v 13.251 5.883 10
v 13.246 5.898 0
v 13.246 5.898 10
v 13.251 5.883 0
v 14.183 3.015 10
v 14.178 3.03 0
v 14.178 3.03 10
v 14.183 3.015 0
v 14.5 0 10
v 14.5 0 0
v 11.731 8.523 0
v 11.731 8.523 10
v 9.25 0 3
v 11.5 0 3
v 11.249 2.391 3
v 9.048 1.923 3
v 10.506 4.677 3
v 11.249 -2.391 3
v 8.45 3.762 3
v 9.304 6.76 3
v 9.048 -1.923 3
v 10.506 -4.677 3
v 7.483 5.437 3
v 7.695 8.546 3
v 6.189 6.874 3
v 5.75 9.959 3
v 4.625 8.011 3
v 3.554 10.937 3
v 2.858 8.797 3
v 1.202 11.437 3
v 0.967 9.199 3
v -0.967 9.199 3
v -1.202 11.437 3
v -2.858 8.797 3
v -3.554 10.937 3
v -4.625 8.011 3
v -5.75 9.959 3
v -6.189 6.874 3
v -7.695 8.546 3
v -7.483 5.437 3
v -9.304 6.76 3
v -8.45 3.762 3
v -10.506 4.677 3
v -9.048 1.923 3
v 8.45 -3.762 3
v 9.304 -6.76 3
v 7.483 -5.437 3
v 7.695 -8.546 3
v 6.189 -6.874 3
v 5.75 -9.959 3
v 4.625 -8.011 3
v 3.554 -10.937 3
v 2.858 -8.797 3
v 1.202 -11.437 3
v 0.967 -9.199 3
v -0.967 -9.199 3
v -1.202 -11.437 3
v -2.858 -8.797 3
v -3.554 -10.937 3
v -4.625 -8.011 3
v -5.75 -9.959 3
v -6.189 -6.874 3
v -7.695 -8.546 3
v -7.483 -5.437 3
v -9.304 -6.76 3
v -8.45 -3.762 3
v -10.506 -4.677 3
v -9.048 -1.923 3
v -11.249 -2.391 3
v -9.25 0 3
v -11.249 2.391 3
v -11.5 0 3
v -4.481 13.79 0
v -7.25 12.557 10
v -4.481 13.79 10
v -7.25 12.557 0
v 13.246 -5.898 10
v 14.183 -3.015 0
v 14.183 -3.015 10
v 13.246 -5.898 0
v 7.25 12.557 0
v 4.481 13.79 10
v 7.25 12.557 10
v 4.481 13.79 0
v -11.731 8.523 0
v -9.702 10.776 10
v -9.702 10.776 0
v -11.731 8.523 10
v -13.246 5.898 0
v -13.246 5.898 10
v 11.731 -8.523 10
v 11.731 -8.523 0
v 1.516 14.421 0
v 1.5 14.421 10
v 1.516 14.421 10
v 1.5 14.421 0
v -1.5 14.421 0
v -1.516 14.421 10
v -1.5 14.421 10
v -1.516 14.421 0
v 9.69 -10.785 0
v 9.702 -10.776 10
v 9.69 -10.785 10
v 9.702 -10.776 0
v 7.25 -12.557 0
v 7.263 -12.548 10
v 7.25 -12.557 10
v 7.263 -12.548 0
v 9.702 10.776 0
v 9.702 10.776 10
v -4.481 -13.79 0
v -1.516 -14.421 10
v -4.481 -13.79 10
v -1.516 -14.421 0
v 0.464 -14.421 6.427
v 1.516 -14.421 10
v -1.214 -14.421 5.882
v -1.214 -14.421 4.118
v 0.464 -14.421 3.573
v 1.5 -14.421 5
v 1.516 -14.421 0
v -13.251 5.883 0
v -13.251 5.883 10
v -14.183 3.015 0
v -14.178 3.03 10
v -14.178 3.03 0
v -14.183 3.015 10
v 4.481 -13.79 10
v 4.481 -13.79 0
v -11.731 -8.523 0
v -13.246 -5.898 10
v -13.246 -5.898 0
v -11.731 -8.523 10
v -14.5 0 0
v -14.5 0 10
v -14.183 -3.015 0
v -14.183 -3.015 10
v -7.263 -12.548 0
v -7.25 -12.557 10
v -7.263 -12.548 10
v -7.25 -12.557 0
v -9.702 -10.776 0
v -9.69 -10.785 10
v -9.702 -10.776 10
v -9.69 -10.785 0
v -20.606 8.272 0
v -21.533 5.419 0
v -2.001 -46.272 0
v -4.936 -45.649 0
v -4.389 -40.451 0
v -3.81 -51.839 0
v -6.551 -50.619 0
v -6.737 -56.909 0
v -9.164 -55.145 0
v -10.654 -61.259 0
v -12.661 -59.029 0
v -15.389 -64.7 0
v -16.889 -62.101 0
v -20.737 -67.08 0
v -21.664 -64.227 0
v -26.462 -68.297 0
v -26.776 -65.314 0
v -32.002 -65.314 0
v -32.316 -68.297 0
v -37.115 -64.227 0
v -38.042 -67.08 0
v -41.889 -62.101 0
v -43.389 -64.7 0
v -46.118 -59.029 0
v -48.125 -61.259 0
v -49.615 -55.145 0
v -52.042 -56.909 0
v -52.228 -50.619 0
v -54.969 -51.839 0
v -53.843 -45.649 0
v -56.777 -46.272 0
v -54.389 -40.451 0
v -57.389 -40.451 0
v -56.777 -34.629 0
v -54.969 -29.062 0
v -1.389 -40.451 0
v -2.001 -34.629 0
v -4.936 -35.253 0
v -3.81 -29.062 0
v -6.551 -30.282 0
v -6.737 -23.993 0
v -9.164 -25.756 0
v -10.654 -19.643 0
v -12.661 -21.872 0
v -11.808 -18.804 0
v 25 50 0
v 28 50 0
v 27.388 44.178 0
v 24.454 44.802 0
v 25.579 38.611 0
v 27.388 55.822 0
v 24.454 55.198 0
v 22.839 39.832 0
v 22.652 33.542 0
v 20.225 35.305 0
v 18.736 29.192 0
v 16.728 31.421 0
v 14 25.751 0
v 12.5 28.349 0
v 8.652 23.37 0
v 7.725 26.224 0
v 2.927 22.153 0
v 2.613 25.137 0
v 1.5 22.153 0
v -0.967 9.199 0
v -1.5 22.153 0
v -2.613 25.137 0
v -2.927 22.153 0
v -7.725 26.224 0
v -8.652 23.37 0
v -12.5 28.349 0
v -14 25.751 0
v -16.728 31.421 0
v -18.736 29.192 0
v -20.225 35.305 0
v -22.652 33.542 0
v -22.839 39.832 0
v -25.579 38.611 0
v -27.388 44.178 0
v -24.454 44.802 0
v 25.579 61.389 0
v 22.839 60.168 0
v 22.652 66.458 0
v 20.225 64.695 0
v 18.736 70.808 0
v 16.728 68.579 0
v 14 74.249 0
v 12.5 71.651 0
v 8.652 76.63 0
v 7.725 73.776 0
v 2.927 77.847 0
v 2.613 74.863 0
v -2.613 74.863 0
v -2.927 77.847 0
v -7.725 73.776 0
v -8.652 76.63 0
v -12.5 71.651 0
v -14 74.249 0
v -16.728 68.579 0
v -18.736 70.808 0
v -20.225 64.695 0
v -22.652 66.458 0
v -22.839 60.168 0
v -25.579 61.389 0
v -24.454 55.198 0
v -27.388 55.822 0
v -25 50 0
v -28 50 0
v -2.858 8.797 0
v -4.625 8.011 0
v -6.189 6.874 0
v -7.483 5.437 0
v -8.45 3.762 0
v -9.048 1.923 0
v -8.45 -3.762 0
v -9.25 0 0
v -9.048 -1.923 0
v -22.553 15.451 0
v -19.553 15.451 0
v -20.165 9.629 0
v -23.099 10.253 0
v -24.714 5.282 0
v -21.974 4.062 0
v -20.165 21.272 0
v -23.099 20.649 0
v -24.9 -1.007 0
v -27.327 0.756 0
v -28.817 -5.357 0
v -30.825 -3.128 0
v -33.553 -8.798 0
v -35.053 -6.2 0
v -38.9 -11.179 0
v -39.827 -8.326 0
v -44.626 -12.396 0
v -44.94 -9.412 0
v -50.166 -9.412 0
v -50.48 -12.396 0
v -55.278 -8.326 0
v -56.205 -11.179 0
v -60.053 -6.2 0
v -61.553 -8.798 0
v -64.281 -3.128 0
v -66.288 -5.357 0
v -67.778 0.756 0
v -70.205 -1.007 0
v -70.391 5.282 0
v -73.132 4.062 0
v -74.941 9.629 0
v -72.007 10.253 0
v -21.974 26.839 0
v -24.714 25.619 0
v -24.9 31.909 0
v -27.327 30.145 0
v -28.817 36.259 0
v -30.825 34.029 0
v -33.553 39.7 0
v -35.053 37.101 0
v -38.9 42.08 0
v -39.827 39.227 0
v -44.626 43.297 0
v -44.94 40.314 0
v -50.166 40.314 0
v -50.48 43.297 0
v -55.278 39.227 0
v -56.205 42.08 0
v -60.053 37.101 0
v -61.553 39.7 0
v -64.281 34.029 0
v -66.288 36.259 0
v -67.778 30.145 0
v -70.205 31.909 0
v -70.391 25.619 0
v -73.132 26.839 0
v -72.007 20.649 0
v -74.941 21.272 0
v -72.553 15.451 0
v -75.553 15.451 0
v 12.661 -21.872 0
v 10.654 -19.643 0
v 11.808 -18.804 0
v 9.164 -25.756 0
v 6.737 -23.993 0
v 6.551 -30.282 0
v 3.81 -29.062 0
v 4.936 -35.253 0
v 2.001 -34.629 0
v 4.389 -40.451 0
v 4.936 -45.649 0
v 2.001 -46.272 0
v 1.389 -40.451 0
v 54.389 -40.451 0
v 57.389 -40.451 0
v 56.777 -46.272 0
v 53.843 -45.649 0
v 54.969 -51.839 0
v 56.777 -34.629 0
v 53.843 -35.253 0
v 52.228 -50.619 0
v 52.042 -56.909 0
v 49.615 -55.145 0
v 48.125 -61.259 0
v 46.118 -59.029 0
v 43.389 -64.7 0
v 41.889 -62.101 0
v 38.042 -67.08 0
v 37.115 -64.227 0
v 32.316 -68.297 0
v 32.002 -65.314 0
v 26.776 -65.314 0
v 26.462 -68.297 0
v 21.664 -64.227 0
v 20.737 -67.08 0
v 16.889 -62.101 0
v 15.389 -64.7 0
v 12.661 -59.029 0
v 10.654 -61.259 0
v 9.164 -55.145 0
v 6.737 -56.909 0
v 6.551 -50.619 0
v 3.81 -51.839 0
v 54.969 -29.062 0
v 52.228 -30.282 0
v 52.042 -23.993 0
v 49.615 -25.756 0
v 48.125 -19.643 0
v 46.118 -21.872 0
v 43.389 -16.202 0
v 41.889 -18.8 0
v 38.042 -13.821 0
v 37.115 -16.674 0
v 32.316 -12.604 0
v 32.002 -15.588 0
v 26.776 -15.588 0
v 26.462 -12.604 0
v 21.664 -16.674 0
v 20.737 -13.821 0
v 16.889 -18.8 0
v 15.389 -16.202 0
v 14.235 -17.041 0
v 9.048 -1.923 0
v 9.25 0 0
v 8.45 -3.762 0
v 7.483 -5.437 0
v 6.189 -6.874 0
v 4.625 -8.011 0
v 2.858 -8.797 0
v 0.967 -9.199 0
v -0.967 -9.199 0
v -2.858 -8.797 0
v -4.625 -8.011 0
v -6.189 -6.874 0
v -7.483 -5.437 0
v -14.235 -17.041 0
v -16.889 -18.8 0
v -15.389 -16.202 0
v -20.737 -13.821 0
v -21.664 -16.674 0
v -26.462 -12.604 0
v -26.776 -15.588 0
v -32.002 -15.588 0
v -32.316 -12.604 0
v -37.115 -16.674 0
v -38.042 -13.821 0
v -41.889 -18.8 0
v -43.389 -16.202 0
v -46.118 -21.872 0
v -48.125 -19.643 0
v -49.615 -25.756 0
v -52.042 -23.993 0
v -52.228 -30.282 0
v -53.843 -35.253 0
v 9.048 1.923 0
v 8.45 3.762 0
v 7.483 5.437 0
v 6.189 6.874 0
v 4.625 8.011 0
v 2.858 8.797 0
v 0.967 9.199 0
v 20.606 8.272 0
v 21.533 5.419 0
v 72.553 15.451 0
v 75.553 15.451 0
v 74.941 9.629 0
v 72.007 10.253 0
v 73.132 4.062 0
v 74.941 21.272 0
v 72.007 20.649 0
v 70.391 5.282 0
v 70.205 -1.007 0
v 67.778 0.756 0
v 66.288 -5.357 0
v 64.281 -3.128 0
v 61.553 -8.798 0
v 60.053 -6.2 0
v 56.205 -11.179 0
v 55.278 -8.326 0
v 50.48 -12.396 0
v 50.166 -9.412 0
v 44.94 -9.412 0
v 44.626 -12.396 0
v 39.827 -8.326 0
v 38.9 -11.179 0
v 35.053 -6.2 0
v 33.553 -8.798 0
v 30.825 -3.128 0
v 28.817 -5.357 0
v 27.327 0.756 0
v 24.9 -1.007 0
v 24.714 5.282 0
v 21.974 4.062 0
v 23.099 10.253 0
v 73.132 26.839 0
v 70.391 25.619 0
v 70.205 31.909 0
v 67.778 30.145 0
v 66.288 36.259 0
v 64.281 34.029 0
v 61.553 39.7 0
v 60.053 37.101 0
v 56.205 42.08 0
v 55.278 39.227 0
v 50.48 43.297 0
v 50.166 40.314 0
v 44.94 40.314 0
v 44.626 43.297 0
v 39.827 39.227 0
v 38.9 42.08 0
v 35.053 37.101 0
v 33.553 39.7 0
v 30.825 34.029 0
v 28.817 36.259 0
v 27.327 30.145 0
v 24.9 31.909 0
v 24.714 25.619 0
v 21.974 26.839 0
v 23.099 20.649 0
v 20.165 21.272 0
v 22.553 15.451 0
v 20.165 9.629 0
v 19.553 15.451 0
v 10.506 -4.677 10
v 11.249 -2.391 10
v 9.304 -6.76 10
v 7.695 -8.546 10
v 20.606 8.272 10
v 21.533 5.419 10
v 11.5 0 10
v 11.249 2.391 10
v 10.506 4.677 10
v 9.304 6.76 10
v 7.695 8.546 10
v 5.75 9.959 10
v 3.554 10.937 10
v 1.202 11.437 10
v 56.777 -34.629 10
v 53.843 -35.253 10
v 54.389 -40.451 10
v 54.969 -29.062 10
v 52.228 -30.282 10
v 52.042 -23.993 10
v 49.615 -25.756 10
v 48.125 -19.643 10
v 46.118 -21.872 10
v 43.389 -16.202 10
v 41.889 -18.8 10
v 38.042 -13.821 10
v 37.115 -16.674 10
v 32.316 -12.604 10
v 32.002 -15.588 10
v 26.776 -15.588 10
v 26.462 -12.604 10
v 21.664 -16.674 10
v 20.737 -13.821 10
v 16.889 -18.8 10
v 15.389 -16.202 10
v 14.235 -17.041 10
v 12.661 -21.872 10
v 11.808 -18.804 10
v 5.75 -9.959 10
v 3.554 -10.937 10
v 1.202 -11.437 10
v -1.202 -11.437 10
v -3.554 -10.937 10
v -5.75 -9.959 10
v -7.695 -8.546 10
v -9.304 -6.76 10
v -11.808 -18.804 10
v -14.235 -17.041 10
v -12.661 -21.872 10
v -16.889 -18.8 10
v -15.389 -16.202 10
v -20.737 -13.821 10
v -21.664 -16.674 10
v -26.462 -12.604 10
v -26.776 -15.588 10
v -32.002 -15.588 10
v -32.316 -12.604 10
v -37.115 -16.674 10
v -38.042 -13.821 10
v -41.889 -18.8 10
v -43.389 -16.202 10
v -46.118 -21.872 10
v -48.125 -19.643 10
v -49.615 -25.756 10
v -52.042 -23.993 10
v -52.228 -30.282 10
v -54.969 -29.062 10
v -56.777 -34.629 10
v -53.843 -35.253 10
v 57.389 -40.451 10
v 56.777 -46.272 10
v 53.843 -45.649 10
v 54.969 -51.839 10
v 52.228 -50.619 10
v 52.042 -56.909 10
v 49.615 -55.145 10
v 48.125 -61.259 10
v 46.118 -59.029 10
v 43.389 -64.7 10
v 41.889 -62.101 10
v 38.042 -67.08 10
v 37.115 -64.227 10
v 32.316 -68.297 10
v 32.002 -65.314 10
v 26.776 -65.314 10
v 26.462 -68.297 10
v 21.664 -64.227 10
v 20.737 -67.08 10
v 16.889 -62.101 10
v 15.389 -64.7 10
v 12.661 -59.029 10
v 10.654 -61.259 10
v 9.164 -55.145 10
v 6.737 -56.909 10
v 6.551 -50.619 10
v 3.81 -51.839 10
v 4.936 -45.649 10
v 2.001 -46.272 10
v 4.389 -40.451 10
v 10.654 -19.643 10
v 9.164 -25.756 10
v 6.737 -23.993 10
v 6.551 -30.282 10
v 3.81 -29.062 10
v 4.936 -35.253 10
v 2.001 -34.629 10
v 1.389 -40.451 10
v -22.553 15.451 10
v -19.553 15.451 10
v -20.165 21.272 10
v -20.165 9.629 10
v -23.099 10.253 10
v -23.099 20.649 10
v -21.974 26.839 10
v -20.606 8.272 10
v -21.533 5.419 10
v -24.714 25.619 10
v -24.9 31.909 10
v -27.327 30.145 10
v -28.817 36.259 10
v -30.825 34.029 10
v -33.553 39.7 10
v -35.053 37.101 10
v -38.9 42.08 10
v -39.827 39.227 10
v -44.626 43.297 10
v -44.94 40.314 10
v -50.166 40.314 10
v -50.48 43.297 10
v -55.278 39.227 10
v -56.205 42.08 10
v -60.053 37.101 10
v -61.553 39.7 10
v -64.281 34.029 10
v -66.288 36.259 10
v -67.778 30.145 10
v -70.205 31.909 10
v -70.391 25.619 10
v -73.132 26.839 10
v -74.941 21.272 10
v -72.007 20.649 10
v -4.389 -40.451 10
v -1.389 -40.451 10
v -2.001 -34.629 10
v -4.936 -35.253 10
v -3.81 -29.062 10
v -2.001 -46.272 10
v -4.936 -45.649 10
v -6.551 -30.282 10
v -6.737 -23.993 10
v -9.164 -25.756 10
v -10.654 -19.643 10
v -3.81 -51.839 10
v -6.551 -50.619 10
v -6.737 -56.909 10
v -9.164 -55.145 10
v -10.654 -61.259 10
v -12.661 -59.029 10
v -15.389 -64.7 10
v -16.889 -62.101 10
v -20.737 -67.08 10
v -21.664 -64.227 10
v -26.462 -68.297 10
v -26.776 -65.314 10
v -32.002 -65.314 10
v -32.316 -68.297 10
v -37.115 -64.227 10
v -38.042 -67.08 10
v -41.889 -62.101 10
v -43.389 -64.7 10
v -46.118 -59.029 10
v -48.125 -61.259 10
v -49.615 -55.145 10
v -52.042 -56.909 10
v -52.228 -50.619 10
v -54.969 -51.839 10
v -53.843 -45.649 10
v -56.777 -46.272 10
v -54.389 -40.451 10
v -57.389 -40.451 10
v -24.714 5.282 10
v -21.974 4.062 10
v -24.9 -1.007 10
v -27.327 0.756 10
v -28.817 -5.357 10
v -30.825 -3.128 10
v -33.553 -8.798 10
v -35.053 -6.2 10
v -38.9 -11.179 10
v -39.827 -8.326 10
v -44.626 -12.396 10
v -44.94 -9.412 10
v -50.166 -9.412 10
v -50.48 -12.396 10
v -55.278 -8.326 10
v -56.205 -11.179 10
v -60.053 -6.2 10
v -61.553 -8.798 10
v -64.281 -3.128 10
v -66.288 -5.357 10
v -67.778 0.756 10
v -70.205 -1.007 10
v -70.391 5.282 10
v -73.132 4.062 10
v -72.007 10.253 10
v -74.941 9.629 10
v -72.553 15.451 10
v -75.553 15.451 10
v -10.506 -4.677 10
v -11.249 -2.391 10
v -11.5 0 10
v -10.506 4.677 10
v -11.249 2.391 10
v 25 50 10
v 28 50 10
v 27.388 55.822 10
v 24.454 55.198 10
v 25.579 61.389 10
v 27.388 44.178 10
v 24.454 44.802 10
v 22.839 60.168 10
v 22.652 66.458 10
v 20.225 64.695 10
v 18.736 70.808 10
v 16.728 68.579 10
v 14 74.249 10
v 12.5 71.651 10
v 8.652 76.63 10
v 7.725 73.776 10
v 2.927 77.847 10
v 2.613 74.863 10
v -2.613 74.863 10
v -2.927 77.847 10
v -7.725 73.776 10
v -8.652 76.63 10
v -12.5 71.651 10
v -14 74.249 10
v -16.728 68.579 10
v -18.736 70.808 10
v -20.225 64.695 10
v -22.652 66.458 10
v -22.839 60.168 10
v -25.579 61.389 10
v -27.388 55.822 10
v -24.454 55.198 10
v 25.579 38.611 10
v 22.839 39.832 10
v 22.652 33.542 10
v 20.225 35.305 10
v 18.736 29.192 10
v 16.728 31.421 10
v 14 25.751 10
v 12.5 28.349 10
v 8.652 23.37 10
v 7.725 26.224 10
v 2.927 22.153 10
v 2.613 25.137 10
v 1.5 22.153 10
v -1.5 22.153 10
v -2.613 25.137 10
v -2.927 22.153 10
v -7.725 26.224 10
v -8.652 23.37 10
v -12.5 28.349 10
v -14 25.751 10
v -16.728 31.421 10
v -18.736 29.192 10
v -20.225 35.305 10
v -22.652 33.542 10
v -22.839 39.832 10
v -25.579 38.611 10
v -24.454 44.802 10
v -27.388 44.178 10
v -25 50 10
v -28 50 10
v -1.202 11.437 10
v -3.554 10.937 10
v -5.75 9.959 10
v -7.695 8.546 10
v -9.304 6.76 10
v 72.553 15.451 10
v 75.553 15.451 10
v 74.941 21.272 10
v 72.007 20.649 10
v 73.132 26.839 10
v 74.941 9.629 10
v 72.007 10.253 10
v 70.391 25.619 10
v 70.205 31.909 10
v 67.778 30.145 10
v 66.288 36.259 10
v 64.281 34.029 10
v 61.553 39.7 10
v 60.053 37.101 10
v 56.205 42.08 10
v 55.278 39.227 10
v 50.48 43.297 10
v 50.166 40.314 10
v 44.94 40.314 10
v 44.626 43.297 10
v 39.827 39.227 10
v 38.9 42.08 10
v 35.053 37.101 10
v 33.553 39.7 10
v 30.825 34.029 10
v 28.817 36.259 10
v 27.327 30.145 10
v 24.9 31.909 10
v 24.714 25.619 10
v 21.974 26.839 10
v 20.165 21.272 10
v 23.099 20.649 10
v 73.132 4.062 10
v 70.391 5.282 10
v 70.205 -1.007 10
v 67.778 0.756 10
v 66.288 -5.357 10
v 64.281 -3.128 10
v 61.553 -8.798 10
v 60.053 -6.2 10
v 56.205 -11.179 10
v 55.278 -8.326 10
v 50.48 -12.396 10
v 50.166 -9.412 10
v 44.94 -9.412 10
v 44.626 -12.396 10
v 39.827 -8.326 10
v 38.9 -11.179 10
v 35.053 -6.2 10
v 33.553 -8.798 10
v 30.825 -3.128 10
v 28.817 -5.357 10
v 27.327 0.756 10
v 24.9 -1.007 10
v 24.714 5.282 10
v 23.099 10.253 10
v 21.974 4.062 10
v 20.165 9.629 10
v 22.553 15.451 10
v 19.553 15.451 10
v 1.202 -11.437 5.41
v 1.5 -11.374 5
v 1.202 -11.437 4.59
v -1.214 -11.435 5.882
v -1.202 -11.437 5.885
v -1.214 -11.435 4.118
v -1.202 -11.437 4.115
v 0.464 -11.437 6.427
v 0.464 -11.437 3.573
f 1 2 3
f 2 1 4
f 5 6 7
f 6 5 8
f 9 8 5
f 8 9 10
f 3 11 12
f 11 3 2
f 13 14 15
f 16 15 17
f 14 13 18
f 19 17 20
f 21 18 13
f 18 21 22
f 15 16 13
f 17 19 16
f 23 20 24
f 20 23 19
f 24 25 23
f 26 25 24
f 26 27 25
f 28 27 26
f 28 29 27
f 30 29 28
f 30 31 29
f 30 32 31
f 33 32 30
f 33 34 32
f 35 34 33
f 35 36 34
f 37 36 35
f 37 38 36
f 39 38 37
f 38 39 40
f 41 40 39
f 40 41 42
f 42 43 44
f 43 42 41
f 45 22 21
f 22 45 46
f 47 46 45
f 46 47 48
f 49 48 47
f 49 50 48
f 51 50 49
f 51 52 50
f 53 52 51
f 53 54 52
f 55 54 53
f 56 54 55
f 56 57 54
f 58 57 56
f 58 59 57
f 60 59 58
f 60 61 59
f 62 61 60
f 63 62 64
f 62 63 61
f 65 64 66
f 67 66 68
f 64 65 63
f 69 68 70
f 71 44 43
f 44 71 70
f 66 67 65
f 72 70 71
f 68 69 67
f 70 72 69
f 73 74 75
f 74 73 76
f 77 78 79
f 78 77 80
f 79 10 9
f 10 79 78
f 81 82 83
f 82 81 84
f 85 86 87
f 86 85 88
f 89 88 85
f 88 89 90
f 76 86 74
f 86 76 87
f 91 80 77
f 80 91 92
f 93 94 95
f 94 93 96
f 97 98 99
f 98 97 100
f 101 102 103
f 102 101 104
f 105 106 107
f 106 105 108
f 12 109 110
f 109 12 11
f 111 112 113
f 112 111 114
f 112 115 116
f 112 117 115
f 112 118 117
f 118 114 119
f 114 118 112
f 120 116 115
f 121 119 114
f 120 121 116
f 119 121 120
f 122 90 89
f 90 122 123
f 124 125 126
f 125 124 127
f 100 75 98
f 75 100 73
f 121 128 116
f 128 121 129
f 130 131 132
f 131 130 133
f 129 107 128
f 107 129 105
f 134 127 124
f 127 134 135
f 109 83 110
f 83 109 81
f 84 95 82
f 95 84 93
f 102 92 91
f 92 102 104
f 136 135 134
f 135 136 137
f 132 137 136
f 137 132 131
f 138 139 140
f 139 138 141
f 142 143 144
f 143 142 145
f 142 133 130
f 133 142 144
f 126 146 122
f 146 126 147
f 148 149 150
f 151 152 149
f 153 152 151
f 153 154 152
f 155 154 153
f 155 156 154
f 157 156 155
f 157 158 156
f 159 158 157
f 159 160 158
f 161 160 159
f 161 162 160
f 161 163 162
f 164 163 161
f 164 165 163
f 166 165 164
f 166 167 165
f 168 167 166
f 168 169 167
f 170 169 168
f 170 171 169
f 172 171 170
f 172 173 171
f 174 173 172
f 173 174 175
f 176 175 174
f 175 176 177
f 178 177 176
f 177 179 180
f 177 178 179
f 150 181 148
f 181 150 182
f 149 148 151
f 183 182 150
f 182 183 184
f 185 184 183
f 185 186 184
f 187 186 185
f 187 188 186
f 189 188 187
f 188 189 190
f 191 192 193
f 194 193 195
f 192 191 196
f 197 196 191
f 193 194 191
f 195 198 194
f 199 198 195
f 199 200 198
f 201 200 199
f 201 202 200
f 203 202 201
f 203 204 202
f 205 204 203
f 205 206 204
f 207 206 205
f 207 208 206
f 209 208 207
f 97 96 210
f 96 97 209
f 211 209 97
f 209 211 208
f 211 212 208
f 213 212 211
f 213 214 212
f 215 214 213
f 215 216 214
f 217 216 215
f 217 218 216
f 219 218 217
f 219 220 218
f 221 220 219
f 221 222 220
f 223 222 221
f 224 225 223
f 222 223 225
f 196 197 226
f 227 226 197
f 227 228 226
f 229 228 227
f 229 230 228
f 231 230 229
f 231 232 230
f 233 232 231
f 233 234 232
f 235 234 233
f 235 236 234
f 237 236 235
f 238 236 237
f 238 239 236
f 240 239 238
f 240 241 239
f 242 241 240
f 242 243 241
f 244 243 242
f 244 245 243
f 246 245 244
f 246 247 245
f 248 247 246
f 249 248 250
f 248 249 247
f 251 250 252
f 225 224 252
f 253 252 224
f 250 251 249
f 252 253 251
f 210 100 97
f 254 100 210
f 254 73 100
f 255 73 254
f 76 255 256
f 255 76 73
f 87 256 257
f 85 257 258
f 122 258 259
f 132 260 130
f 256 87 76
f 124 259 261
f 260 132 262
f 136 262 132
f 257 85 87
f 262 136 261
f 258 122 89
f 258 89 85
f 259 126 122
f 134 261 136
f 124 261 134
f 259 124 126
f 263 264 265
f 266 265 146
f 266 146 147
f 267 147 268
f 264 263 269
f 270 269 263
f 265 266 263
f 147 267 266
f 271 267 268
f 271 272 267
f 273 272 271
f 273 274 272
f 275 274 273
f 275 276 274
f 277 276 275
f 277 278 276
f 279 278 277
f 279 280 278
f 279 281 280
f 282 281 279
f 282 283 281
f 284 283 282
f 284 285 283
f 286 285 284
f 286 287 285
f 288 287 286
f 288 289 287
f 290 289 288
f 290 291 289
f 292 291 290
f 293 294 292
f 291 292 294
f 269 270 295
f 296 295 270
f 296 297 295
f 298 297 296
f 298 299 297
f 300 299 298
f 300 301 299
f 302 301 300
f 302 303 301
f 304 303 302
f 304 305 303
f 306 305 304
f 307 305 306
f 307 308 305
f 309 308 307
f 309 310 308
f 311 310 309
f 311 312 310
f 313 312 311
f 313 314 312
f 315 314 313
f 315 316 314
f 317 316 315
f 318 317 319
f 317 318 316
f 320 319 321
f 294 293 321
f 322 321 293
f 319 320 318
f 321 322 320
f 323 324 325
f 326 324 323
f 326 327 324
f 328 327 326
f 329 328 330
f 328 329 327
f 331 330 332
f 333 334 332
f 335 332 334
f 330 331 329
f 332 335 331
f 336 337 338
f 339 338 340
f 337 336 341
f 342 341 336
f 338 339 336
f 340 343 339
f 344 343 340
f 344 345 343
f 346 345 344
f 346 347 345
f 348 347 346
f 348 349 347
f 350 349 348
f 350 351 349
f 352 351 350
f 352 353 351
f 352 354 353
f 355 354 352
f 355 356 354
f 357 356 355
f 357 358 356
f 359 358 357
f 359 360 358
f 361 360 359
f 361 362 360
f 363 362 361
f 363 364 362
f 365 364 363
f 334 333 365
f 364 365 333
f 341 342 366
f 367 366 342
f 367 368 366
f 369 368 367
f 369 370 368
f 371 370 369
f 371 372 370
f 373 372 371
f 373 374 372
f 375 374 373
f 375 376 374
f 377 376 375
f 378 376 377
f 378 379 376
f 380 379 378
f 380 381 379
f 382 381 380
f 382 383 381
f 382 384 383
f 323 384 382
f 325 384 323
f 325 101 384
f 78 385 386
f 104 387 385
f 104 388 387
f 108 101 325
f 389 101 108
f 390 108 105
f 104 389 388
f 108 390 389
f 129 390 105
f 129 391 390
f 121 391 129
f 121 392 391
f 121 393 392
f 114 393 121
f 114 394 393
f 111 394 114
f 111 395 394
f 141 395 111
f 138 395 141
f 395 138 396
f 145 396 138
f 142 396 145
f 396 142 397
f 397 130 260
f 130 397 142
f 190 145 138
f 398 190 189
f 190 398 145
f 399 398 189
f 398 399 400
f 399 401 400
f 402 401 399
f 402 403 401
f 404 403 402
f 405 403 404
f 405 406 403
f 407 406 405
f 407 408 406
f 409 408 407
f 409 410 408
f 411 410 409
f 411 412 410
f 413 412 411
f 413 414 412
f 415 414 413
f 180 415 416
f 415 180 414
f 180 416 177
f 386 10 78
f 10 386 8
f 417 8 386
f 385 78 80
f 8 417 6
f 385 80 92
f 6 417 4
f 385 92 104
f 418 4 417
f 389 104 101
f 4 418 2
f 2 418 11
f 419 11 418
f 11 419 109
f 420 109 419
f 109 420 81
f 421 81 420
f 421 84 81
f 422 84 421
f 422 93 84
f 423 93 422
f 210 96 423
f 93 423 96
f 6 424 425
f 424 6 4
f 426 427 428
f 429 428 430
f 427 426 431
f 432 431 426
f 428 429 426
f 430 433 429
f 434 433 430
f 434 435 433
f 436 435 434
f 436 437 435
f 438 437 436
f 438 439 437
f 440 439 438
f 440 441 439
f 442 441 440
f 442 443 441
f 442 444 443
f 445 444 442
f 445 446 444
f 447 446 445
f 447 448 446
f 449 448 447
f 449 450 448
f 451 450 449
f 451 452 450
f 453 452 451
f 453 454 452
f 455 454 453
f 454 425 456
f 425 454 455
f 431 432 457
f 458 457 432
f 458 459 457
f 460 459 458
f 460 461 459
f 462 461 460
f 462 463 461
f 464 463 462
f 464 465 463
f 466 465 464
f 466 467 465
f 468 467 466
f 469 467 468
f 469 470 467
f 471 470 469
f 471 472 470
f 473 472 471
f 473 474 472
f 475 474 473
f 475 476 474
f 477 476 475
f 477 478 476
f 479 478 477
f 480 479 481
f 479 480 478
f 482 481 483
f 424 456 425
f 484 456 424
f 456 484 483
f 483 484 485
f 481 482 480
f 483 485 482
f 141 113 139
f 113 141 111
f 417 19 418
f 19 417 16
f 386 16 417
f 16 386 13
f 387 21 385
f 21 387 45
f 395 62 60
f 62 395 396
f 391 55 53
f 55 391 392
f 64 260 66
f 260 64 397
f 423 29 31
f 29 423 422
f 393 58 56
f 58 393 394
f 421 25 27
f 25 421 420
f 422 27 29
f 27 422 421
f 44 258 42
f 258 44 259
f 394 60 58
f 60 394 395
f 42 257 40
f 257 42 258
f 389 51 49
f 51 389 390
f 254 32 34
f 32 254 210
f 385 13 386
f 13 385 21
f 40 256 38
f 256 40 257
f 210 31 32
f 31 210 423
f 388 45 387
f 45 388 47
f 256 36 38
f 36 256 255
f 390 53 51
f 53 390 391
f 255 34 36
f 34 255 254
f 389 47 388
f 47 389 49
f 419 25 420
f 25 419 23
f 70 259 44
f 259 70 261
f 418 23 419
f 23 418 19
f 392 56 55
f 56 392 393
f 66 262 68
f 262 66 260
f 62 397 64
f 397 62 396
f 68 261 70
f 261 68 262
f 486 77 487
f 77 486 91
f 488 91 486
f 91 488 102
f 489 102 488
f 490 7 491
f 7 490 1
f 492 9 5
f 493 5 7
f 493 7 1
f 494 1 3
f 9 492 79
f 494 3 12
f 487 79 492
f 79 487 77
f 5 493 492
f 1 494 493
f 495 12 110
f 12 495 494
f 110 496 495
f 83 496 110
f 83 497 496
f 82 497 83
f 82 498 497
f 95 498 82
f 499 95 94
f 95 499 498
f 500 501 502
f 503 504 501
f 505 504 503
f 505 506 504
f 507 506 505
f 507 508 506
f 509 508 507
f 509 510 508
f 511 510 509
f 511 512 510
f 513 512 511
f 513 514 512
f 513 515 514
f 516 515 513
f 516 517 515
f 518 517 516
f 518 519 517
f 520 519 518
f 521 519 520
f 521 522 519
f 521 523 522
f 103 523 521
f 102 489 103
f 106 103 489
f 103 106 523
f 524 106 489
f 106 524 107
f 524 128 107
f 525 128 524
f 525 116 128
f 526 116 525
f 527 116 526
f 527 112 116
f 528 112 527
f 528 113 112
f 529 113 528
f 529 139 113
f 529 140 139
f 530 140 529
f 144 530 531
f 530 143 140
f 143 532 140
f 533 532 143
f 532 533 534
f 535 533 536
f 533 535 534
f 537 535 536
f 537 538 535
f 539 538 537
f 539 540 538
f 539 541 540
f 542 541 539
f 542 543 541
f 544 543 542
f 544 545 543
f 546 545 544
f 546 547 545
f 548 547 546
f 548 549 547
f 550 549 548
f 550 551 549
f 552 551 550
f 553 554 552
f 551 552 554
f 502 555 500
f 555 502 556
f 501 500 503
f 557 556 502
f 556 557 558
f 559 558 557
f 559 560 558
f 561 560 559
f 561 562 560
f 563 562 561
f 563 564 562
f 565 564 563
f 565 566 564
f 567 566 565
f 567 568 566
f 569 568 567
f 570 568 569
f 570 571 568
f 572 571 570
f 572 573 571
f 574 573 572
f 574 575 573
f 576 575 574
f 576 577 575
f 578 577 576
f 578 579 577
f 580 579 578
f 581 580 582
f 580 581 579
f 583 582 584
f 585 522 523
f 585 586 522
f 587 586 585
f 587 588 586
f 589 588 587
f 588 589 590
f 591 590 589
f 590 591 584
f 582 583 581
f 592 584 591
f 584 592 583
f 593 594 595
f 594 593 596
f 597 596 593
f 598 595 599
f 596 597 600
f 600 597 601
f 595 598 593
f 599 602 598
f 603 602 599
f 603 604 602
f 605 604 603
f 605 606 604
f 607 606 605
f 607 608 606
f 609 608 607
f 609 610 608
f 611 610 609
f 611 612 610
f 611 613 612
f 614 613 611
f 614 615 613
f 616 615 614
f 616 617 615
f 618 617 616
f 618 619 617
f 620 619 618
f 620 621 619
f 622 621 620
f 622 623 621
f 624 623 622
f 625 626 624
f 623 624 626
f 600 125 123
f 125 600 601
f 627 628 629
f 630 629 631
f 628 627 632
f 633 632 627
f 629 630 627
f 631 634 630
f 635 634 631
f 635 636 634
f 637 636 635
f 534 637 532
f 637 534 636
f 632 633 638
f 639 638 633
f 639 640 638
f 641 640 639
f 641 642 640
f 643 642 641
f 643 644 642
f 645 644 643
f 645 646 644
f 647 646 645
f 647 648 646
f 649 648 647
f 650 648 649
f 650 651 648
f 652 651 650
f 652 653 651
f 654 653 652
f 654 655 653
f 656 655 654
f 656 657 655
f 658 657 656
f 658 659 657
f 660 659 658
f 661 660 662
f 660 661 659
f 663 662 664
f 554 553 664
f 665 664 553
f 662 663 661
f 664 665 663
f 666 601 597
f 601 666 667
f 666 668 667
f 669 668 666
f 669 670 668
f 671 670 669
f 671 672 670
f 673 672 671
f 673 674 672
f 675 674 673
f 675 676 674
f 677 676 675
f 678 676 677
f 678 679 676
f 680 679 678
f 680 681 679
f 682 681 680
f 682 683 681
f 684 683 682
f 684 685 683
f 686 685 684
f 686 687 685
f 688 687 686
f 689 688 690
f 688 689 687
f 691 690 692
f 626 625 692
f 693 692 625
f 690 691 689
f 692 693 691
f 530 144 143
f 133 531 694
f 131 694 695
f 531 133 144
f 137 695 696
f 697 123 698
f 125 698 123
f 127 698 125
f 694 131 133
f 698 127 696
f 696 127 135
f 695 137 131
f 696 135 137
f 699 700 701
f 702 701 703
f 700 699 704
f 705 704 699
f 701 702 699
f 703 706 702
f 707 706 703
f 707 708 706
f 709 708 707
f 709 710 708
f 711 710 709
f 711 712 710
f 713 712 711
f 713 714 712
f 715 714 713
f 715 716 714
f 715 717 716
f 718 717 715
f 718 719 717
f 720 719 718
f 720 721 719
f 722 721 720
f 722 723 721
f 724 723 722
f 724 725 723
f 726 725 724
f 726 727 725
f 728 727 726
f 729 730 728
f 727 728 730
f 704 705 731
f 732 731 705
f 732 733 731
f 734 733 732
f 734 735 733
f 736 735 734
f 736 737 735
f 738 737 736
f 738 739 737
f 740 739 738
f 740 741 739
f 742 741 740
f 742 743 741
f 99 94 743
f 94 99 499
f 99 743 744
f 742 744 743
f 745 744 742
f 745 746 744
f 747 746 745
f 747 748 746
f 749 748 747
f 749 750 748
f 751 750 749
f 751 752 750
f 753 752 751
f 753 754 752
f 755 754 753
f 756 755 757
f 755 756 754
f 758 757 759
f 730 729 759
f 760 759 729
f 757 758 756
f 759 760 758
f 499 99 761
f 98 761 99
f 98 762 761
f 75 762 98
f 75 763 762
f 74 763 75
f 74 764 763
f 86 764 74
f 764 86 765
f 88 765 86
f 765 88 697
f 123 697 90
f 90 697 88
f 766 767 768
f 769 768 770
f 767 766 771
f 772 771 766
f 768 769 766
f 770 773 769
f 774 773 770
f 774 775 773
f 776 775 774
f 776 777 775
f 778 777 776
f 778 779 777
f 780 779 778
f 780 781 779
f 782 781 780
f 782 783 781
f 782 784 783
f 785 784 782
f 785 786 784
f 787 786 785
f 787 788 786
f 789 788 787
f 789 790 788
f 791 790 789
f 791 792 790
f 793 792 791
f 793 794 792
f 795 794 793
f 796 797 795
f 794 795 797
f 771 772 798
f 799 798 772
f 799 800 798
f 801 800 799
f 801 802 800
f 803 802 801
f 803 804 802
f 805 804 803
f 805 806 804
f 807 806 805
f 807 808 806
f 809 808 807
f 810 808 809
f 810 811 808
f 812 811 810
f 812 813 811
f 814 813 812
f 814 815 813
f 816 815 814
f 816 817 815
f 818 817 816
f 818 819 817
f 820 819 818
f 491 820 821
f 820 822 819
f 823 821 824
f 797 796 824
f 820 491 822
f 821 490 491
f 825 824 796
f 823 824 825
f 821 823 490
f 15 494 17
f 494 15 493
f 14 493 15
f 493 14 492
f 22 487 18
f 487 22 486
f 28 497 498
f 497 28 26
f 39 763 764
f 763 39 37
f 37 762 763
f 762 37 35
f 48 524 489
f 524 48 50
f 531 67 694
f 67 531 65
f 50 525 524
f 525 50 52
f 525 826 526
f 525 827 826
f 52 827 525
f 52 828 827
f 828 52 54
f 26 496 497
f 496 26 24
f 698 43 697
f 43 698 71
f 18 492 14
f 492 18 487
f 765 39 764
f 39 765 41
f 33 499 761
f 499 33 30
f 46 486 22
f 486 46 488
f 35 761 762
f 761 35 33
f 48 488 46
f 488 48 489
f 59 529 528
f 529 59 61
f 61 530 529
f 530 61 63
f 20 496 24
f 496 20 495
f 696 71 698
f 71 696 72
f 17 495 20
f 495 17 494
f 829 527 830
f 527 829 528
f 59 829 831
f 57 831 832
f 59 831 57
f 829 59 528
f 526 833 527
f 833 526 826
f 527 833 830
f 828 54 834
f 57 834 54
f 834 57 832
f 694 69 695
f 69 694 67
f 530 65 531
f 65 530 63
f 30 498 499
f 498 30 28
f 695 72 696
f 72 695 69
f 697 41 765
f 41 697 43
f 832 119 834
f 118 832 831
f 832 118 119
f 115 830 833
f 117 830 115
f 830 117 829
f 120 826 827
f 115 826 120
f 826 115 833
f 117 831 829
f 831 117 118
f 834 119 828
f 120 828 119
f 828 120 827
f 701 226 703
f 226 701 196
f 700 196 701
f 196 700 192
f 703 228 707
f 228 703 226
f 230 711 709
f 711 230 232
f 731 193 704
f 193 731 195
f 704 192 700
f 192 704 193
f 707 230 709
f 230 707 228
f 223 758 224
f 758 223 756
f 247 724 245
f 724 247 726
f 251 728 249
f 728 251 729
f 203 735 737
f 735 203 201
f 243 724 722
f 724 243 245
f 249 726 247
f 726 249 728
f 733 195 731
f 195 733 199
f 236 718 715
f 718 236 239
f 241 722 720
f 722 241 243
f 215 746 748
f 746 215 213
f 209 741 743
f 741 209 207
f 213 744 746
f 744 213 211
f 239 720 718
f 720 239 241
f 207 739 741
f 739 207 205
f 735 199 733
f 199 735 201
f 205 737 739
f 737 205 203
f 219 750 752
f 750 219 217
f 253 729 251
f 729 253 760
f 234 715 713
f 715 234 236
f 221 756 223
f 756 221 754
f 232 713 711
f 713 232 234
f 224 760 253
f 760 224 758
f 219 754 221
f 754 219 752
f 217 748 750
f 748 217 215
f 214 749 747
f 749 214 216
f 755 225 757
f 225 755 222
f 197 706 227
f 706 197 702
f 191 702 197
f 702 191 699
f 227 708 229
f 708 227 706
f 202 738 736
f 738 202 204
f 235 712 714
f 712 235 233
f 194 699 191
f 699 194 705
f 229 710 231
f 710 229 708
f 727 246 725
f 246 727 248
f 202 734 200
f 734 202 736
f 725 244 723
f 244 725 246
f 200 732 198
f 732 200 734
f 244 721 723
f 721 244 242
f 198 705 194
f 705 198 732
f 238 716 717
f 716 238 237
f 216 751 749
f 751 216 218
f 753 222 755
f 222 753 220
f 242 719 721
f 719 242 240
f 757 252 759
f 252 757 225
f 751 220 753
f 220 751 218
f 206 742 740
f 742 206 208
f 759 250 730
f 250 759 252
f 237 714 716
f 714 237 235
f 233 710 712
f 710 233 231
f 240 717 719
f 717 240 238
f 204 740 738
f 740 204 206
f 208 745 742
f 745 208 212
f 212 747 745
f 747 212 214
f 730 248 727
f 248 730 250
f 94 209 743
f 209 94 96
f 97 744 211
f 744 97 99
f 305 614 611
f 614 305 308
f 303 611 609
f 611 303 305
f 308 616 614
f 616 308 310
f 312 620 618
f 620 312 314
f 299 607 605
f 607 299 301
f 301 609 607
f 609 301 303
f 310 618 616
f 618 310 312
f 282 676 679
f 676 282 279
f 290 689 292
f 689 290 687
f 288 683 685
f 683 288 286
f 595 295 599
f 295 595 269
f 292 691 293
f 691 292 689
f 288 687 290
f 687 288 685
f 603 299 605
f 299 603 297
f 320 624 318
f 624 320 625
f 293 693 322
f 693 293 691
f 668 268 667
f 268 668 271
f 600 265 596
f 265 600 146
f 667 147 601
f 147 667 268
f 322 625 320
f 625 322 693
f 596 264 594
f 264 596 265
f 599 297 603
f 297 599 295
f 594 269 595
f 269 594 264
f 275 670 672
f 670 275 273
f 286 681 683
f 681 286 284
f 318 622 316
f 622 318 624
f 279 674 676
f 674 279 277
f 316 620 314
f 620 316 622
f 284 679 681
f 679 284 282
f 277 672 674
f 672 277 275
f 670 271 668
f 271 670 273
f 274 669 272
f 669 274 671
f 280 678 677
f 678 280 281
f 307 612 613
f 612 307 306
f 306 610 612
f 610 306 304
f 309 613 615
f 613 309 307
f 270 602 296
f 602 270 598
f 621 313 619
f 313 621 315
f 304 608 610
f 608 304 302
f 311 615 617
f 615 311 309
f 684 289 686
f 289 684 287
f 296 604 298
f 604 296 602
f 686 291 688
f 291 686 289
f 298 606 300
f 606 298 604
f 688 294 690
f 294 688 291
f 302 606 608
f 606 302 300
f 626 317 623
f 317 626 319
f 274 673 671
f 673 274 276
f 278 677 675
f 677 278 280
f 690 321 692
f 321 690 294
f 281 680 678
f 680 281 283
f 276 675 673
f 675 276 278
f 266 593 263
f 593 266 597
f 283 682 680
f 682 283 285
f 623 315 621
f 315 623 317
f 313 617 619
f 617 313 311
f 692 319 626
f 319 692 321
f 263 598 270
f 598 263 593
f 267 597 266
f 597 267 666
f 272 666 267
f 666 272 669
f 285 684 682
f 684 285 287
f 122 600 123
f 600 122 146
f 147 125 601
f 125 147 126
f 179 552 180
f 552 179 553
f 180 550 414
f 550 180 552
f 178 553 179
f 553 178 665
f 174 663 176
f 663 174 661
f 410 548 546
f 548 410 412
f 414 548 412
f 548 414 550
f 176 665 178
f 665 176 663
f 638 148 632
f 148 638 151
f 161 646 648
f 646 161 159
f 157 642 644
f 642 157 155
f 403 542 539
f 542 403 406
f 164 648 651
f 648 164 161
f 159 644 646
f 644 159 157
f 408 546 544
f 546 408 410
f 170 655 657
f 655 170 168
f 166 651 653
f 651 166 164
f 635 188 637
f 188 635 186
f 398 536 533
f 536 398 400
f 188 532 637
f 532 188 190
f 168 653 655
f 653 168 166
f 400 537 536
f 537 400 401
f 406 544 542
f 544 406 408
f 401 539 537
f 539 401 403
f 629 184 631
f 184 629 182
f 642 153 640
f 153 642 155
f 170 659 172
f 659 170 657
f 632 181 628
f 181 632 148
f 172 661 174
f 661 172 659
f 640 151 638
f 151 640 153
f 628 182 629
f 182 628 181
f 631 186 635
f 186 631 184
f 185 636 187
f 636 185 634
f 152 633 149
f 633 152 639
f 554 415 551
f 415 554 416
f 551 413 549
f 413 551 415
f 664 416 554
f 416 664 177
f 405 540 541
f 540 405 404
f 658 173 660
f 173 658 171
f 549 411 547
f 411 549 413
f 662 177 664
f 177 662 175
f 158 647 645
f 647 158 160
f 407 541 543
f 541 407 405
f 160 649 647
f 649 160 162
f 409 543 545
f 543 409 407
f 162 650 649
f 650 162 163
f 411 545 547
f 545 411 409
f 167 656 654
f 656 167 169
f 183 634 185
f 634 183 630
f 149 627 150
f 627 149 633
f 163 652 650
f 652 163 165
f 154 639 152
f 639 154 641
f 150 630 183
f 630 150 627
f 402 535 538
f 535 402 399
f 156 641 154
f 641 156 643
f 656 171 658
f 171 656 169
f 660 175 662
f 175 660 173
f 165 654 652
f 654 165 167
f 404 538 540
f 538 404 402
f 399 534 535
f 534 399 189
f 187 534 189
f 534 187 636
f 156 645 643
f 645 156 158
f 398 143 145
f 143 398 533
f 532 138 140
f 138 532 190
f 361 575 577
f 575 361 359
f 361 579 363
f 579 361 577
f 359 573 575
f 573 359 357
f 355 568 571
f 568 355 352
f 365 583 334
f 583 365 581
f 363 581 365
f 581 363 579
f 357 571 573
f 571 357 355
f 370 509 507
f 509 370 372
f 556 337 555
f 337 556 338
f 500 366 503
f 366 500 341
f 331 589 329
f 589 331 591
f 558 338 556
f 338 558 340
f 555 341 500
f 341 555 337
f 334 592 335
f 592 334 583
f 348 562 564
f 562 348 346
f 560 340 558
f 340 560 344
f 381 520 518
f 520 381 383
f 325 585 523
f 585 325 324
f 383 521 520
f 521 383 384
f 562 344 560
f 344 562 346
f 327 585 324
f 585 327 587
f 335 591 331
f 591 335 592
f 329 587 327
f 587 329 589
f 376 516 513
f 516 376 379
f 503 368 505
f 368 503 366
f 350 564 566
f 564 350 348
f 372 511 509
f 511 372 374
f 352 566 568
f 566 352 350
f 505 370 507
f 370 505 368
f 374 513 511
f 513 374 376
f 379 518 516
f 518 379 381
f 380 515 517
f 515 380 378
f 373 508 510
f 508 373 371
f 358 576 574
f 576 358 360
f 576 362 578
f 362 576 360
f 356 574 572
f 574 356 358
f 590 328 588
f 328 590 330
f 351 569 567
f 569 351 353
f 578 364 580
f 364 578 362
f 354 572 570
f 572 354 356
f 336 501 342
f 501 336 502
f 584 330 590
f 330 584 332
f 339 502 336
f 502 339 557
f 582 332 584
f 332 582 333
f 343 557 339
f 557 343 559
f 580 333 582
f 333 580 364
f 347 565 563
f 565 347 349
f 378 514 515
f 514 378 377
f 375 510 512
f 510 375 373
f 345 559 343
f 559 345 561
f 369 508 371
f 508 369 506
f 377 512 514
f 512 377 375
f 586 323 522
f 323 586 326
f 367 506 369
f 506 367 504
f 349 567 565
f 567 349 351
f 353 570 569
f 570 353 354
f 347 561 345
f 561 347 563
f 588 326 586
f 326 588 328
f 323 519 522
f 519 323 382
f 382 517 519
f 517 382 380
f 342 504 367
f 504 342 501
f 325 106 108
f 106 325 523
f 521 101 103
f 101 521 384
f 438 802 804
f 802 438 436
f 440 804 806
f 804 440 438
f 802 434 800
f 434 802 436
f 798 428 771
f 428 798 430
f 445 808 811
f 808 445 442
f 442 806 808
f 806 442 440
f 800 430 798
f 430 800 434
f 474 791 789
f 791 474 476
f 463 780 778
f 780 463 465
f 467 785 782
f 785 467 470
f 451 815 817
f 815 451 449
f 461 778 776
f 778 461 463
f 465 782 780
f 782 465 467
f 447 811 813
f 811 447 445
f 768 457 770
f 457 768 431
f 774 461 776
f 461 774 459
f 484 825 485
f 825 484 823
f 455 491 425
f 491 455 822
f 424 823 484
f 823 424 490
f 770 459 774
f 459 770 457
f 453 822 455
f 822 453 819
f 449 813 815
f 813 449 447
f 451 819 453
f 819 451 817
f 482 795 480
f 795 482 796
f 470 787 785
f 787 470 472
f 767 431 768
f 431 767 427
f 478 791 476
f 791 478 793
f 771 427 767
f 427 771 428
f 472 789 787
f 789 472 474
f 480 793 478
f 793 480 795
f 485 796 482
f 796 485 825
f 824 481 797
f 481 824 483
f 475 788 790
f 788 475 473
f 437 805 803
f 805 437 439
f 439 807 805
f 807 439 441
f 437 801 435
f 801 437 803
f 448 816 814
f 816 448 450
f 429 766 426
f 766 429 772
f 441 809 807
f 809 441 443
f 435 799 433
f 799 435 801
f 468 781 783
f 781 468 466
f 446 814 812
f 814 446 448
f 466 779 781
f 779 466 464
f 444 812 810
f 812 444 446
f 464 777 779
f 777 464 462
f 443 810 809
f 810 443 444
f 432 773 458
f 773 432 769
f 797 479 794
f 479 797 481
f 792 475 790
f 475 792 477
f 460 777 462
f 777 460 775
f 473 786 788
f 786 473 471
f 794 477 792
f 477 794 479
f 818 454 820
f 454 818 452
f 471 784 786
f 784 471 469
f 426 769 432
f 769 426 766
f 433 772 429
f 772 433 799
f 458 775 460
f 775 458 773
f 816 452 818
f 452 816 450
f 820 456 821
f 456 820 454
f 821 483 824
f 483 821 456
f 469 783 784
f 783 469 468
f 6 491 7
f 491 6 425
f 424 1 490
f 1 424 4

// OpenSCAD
ball_od = 50;
ball_offset = 50;
thick = 3;
height = 10;

union() {
	difference() {
		union() {
			difference() {
				cylinder(d = 29, h = 3);
				translate(v = [0, 0, -1.5000000000]) {
					cylinder(d = 18.5000000000, h = 6);
				}
			}
			difference() {
				cylinder(d = 29, h = 10);
				translate(v = [0, 0, -5.0000000000]) {
					cylinder(d = 23, h = 20);
				}
			}
		}
		translate(v = [0, 0, 5.0000000000]) {
			rotate(a = [90, 0, 0]) {
				cylinder(d = 3, h = 30);
			}
		}
	}
	translate(v = [0, ((((ball_offset - ((ball_od / 2) + 14.5)) / 2) + 14.5) - (thick / 2)), 0]) {
		translate(v = [0, 0, (height / 2)]) {
			cube(center = true, size = [thick, (ball_offset - ((ball_od / 2) + 14.5)), height]);
		}
	}
	translate(v = [0, ball_offset, 0]) {
		difference() {
			cylinder(d = (ball_od + (2 * thick)), h = height);
			translate(v = [0, 0, (-(height / 2))]) {
				cylinder(d = ball_od, h = (2 * height));
			}
		}
	}
	rotate(a = [0, 0, 0.0000000000]) {
		union() {
			translate(v = [0, ((((ball_offset - ((ball_od / 2) + 14.5)) / 2) + 14.5) - (thick / 2)), 0]) {
				translate(v = [0, 0, (height / 2)]) {
					cube(center = true, size = [thick, (ball_offset - ((ball_od / 2) + 14.5)), height]);
				}
			}
			translate(v = [0, ball_offset, 0]) {
				difference() {
					cylinder(d = (ball_od + (2 * thick)), h = height);
					translate(v = [0, 0, (-(height / 2))]) {
						cylinder(d = ball_od, h = (2 * height));
					}
				}
			}
		}
	}
	rotate(a = [0, 0, 72.0000000000]) {
		union() {
			translate(v = [0, ((((ball_offset - ((ball_od / 2) + 14.5)) / 2) + 14.5) - (thick / 2)), 0]) {
				translate(v = [0, 0, (height / 2)]) {
					cube(center = true, size = [thick, (ball_offset - ((ball_od / 2) + 14.5)), height]);
				}
			}
			translate(v = [0, ball_offset, 0]) {
				difference() {
					cylinder(d = (ball_od + (2 * thick)), h = height);
					translate(v = [0, 0, (-(height / 2))]) {
						cylinder(d = ball_od, h = (2 * height));
					}
				}
			}
		}
	}
	rotate(a = [0, 0, 144.0000000000]) {
		union() {
			translate(v = [0, ((((ball_offset - ((ball_od / 2) + 14.5)) / 2) + 14.5) - (thick / 2)), 0]) {
				translate(v = [0, 0, (height / 2)]) {
					cube(center = true, size = [thick, (ball_offset - ((ball_od / 2) + 14.5)), height]);
				}
			}
			translate(v = [0, ball_offset, 0]) {
				difference() {
					cylinder(d = (ball_od + (2 * thick)), h = height);
					translate(v = [0, 0, (-(height / 2))]) {
						cylinder(d = ball_od, h = (2 * height));
					}
				}
			}
		}
	}
	rotate(a = [0, 0, 216.0000000000]) {
		union() {
			translate(v = [0, ((((ball_offset - ((ball_od / 2) + 14.5)) / 2) + 14.5) - (thick / 2)), 0]) {
				translate(v = [0, 0, (height / 2)]) {
					cube(center = true, size = [thick, (ball_offset - ((ball_od / 2) + 14.5)), height]);
				}
			}
			translate(v = [0, ball_offset, 0]) {
				difference() {
					cylinder(d = (ball_od + (2 * thick)), h = height);
					translate(v = [0, 0, (-(height / 2))]) {
						cylinder(d = ball_od, h = (2 * height));
					}
				}
			}
		}
	}
	rotate(a = [0, 0, 288.0000000000]) {
		union() {
			translate(v = [0, ((((ball_offset - ((ball_od / 2) + 14.5)) / 2) + 14.5) - (thick / 2)), 0]) {
				translate(v = [0, 0, (height / 2)]) {
					cube(center = true, size = [thick, (ball_offset - ((ball_od / 2) + 14.5)), height]);
				}
			}
			translate(v = [0, ball_offset, 0]) {
				difference() {
					cylinder(d = (ball_od + (2 * thick)), h = height);
					translate(v = [0, 0, (-(height / 2))]) {
						cylinder(d = ball_od, h = (2 * height));
					}
				}
			}
		}
	}
}
